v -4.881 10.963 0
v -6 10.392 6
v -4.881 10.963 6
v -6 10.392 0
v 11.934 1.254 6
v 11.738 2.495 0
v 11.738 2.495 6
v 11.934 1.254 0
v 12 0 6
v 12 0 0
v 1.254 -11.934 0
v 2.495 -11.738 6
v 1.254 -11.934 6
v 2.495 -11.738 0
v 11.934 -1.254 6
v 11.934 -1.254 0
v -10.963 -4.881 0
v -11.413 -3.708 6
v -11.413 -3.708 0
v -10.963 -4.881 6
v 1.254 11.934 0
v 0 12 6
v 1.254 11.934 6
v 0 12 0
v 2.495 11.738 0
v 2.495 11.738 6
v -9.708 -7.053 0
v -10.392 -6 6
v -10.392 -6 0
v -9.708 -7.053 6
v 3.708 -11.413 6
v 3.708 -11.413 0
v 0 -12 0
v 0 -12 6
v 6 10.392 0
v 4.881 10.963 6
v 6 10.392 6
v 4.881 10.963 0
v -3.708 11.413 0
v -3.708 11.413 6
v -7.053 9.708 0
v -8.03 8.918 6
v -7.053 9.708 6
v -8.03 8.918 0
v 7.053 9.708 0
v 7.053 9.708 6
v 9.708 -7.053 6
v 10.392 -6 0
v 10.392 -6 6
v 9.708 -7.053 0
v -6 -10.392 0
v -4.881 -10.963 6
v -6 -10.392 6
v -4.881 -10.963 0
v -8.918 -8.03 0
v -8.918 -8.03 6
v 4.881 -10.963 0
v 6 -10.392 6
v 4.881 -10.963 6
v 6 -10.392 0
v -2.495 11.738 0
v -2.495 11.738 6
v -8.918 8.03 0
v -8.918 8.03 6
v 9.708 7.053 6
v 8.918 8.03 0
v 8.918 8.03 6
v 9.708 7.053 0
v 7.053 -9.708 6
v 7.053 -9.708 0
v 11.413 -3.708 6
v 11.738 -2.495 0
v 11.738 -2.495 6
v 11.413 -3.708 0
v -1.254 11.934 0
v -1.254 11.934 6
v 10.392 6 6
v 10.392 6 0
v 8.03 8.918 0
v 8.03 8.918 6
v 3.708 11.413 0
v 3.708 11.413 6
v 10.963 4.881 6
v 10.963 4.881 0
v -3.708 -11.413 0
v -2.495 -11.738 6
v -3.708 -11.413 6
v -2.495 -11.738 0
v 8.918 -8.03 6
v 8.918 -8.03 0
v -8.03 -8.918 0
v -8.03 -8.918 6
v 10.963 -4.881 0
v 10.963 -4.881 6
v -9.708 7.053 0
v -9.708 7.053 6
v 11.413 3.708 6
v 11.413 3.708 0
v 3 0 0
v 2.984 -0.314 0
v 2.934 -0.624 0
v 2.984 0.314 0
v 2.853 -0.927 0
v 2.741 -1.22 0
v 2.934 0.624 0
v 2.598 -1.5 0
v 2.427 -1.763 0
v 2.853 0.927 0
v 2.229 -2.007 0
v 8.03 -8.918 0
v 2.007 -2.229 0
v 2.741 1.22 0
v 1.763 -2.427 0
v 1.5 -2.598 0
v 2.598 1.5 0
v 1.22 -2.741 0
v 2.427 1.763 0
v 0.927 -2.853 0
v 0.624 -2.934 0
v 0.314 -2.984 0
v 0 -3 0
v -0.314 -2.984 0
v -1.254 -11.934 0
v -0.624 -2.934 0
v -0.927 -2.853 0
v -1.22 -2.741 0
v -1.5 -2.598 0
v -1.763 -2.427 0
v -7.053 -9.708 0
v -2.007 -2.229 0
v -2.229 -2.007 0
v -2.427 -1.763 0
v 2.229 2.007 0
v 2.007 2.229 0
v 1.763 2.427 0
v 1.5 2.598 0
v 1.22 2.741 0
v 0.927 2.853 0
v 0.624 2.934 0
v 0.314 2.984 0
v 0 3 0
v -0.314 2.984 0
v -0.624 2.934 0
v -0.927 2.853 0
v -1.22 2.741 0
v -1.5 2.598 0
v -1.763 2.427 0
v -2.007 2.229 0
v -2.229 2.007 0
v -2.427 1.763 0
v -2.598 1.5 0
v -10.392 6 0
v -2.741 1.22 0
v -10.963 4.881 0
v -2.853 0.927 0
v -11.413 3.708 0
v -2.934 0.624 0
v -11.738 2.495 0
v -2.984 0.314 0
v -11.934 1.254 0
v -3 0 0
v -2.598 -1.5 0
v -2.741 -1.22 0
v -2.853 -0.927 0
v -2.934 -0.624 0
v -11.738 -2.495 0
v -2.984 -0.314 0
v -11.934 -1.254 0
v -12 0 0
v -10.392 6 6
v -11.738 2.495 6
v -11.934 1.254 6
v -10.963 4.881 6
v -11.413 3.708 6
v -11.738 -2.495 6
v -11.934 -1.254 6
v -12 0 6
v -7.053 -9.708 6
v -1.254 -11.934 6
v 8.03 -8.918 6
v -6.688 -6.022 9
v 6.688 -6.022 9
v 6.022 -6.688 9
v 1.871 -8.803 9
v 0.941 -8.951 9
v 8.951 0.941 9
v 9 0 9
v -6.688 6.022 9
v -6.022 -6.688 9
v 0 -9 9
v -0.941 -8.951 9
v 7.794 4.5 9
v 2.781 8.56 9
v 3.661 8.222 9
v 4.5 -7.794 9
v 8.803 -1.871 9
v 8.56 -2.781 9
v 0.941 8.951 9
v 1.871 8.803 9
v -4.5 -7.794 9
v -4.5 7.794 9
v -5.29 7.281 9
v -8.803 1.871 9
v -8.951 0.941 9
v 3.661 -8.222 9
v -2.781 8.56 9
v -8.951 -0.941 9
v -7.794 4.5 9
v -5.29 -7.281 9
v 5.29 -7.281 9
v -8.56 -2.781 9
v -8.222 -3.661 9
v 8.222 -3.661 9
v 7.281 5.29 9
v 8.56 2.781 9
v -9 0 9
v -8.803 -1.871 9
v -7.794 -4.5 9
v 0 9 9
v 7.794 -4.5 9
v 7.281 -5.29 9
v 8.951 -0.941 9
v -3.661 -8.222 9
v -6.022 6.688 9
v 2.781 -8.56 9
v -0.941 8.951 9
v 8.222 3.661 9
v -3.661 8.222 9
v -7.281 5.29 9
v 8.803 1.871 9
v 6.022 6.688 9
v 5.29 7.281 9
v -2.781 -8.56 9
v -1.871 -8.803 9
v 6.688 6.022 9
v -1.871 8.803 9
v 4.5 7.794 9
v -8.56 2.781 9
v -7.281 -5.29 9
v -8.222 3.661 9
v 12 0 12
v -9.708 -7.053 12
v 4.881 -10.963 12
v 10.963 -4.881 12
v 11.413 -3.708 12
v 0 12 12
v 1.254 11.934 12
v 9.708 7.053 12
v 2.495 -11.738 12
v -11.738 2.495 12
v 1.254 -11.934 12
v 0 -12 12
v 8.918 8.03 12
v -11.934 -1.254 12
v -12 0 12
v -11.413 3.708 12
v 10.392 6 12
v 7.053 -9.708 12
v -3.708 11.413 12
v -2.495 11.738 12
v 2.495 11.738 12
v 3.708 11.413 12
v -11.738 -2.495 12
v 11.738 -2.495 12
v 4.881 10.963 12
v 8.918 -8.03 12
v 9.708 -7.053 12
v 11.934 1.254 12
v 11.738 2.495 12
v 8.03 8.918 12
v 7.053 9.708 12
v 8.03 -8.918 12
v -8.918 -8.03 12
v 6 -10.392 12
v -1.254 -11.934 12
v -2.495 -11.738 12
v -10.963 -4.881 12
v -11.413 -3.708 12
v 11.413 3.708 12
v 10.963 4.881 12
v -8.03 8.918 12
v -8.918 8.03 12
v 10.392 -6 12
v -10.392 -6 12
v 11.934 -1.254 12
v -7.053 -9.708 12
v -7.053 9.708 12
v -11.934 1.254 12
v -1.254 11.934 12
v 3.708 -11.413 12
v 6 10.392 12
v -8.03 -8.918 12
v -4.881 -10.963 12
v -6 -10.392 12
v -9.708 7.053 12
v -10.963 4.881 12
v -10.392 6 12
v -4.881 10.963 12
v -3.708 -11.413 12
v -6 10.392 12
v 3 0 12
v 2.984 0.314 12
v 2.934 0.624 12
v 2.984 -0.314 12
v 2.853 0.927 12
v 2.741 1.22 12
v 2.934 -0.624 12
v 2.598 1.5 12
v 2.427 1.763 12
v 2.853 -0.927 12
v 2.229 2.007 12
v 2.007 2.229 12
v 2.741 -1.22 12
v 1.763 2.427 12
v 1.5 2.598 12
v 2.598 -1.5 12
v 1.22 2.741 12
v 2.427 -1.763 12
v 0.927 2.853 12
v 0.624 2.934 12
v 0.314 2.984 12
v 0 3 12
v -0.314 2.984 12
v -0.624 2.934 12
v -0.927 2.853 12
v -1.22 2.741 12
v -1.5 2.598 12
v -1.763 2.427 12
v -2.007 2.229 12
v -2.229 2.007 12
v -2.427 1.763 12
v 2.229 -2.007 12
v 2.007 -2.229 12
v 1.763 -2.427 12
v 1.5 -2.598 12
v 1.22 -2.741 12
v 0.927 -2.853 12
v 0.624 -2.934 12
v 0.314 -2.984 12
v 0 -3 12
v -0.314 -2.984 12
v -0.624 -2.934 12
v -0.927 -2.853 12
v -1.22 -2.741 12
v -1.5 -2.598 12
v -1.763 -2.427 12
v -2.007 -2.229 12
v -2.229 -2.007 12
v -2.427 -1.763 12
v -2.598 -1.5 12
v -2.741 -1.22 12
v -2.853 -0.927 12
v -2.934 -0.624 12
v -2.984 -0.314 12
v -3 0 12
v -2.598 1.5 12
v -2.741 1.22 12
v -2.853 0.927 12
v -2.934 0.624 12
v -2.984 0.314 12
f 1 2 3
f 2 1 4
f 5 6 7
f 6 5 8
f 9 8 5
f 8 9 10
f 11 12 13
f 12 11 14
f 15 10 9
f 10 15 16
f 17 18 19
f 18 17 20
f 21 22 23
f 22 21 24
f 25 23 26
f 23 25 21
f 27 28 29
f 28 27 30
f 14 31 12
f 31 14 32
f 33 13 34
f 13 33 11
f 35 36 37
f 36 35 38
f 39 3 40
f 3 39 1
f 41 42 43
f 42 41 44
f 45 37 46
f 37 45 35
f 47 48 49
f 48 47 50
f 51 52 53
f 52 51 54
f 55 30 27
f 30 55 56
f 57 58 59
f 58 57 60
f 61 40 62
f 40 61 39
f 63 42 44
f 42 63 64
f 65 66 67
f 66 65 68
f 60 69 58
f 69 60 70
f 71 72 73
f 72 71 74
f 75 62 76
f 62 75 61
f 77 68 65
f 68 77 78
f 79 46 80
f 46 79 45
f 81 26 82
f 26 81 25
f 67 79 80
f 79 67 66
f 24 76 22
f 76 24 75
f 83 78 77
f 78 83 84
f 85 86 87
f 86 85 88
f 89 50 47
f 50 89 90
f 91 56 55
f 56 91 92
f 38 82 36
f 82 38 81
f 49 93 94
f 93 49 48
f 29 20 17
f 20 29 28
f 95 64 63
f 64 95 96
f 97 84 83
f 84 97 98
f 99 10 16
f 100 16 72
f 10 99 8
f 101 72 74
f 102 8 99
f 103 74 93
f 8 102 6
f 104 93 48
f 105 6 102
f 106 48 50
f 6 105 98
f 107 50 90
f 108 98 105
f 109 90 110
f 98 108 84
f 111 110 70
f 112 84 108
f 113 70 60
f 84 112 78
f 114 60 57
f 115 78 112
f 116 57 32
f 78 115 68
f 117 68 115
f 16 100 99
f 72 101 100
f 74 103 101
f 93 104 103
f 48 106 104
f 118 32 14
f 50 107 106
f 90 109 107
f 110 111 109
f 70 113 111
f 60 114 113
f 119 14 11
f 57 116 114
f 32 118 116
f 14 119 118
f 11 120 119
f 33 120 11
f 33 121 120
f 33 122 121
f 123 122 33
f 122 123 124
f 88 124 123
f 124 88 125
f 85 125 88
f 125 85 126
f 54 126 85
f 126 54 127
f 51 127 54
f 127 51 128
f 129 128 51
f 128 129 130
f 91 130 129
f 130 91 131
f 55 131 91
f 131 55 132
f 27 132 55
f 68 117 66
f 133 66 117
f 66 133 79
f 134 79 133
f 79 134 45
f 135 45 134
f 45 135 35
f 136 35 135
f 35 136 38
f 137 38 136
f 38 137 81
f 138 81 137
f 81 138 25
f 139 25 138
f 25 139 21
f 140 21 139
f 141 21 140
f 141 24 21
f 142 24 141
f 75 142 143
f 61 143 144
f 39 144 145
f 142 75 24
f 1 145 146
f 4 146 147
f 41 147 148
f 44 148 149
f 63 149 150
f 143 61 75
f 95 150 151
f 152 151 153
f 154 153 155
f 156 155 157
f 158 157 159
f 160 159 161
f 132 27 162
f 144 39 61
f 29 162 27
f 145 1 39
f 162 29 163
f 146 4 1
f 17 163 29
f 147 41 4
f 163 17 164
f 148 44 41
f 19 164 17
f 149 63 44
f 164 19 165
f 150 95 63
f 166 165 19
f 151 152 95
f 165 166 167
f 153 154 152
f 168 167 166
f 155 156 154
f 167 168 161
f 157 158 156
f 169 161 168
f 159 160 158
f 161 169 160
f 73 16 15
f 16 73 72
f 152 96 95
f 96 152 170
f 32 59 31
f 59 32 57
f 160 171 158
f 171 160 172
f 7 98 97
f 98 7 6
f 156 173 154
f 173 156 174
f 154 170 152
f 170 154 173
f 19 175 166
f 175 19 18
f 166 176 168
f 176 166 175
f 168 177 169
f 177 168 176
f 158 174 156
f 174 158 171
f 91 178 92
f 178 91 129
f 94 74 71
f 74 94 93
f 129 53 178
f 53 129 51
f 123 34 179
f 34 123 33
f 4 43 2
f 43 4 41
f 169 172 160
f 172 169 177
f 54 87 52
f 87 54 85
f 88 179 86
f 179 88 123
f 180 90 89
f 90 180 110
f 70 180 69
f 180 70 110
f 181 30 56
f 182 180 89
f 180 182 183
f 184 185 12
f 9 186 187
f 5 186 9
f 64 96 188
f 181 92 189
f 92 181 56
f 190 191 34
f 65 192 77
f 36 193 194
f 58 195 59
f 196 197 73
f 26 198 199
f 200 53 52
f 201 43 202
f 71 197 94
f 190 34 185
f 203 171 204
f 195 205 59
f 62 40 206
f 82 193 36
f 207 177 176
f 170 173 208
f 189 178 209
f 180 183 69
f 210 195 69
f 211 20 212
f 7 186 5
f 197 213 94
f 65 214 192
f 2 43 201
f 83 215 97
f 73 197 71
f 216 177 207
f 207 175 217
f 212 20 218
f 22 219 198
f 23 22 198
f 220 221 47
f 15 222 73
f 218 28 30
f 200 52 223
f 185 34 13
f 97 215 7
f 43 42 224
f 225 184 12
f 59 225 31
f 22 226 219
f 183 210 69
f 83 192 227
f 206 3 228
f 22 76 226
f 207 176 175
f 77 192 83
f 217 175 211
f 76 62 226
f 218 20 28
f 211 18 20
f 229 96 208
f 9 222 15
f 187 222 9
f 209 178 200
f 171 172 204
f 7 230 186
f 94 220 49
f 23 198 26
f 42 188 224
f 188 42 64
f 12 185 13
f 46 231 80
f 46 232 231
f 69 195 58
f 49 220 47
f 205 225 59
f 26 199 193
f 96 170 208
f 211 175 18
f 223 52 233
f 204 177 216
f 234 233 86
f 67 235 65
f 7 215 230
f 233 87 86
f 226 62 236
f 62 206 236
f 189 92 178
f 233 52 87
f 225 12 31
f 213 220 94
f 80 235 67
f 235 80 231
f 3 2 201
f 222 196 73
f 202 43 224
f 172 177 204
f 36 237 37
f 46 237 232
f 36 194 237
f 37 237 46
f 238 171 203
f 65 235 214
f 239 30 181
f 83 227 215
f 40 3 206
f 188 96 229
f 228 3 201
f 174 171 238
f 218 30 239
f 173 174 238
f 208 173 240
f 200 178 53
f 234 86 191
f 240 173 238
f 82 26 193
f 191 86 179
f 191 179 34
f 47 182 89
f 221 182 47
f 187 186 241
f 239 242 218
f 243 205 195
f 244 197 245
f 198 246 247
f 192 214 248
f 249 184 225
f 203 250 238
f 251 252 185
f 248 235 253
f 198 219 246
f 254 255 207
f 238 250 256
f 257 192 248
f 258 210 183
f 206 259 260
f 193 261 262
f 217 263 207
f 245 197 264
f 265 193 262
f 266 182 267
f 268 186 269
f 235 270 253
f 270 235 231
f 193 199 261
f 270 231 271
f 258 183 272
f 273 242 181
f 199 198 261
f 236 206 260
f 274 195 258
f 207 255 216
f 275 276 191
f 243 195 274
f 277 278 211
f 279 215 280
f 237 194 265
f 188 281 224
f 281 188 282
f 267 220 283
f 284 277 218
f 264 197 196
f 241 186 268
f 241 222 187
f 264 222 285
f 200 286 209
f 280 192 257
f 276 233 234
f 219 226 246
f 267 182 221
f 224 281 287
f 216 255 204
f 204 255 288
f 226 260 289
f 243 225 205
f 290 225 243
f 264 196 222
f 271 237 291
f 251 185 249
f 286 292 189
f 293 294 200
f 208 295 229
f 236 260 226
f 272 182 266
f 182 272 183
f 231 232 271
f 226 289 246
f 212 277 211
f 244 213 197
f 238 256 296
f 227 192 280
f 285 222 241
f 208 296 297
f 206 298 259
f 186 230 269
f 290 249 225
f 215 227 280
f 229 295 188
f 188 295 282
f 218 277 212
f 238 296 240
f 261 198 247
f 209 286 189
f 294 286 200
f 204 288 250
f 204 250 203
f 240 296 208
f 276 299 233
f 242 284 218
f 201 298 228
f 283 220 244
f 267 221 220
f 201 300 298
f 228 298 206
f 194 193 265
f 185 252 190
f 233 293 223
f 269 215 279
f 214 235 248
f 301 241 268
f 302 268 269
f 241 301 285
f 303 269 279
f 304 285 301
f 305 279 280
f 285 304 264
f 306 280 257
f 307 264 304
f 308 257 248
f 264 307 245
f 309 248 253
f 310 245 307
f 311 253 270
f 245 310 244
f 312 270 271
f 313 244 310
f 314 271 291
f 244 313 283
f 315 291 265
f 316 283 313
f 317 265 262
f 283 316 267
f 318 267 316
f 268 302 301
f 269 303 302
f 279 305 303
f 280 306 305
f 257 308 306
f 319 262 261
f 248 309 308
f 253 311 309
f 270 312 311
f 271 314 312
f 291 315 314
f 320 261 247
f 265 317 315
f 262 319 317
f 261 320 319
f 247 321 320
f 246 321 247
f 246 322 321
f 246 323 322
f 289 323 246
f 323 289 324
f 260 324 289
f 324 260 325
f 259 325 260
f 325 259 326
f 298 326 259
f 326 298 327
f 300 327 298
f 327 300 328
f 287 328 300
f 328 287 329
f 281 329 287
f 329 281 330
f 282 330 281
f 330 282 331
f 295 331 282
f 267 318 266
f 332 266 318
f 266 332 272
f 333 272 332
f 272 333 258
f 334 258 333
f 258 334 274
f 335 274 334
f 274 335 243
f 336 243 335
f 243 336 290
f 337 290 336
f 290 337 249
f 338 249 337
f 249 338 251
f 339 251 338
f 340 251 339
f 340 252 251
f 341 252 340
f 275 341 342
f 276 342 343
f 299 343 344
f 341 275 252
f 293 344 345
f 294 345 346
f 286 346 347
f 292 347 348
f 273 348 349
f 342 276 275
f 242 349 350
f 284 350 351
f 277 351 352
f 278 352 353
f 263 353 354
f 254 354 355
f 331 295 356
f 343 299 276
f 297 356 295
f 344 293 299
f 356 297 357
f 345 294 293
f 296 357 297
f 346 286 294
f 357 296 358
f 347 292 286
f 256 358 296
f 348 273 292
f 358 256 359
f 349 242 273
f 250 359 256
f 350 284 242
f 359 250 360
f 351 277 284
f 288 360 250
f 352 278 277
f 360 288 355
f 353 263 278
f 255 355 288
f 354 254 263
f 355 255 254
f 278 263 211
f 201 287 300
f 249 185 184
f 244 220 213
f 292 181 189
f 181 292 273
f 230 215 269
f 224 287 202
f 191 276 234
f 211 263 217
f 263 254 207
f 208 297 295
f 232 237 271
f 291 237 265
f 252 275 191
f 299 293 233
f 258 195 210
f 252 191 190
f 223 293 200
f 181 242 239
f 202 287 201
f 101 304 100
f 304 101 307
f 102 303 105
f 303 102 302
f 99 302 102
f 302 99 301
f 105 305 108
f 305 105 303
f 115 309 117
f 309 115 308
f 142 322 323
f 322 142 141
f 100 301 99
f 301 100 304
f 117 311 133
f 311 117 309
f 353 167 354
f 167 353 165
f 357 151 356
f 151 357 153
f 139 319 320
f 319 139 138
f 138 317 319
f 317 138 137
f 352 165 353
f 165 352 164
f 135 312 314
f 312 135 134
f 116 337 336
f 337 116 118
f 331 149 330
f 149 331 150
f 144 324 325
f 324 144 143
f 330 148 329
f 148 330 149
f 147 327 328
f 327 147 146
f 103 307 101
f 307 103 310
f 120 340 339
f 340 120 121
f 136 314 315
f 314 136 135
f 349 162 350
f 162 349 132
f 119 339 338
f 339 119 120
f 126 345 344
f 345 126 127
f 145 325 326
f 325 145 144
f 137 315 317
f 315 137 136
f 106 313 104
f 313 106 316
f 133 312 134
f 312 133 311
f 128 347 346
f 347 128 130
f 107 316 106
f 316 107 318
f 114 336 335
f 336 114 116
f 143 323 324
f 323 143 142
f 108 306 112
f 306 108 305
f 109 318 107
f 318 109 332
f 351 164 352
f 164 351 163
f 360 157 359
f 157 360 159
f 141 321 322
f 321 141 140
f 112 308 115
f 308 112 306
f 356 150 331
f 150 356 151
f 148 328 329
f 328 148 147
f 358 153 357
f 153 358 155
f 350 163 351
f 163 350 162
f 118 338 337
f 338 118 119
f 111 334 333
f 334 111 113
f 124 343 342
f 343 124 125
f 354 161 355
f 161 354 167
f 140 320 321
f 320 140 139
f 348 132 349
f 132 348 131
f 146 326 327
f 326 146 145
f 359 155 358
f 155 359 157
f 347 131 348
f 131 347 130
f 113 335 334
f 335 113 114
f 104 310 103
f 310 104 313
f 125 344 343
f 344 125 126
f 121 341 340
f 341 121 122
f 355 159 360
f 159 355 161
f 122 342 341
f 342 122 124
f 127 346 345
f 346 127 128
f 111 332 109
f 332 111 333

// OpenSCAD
// V-groove guide wheel.
$fn = 60;
eps = 0.02;
bore_d = 6;
outer_d = 24;
width = 12;
groove_d = outer_d-6;
difference() {
    union() { cylinder(d=outer_d,h=width/2); translate([0,0,width/2]) cylinder(d1=outer_d,d2=groove_d,h=width/4); translate([0,0,3*width/4]) cylinder(d1=groove_d,d2=outer_d,h=width/4); }
    translate([0,0,-eps]) cylinder(d=bore_d,h=width+2*eps);
}
